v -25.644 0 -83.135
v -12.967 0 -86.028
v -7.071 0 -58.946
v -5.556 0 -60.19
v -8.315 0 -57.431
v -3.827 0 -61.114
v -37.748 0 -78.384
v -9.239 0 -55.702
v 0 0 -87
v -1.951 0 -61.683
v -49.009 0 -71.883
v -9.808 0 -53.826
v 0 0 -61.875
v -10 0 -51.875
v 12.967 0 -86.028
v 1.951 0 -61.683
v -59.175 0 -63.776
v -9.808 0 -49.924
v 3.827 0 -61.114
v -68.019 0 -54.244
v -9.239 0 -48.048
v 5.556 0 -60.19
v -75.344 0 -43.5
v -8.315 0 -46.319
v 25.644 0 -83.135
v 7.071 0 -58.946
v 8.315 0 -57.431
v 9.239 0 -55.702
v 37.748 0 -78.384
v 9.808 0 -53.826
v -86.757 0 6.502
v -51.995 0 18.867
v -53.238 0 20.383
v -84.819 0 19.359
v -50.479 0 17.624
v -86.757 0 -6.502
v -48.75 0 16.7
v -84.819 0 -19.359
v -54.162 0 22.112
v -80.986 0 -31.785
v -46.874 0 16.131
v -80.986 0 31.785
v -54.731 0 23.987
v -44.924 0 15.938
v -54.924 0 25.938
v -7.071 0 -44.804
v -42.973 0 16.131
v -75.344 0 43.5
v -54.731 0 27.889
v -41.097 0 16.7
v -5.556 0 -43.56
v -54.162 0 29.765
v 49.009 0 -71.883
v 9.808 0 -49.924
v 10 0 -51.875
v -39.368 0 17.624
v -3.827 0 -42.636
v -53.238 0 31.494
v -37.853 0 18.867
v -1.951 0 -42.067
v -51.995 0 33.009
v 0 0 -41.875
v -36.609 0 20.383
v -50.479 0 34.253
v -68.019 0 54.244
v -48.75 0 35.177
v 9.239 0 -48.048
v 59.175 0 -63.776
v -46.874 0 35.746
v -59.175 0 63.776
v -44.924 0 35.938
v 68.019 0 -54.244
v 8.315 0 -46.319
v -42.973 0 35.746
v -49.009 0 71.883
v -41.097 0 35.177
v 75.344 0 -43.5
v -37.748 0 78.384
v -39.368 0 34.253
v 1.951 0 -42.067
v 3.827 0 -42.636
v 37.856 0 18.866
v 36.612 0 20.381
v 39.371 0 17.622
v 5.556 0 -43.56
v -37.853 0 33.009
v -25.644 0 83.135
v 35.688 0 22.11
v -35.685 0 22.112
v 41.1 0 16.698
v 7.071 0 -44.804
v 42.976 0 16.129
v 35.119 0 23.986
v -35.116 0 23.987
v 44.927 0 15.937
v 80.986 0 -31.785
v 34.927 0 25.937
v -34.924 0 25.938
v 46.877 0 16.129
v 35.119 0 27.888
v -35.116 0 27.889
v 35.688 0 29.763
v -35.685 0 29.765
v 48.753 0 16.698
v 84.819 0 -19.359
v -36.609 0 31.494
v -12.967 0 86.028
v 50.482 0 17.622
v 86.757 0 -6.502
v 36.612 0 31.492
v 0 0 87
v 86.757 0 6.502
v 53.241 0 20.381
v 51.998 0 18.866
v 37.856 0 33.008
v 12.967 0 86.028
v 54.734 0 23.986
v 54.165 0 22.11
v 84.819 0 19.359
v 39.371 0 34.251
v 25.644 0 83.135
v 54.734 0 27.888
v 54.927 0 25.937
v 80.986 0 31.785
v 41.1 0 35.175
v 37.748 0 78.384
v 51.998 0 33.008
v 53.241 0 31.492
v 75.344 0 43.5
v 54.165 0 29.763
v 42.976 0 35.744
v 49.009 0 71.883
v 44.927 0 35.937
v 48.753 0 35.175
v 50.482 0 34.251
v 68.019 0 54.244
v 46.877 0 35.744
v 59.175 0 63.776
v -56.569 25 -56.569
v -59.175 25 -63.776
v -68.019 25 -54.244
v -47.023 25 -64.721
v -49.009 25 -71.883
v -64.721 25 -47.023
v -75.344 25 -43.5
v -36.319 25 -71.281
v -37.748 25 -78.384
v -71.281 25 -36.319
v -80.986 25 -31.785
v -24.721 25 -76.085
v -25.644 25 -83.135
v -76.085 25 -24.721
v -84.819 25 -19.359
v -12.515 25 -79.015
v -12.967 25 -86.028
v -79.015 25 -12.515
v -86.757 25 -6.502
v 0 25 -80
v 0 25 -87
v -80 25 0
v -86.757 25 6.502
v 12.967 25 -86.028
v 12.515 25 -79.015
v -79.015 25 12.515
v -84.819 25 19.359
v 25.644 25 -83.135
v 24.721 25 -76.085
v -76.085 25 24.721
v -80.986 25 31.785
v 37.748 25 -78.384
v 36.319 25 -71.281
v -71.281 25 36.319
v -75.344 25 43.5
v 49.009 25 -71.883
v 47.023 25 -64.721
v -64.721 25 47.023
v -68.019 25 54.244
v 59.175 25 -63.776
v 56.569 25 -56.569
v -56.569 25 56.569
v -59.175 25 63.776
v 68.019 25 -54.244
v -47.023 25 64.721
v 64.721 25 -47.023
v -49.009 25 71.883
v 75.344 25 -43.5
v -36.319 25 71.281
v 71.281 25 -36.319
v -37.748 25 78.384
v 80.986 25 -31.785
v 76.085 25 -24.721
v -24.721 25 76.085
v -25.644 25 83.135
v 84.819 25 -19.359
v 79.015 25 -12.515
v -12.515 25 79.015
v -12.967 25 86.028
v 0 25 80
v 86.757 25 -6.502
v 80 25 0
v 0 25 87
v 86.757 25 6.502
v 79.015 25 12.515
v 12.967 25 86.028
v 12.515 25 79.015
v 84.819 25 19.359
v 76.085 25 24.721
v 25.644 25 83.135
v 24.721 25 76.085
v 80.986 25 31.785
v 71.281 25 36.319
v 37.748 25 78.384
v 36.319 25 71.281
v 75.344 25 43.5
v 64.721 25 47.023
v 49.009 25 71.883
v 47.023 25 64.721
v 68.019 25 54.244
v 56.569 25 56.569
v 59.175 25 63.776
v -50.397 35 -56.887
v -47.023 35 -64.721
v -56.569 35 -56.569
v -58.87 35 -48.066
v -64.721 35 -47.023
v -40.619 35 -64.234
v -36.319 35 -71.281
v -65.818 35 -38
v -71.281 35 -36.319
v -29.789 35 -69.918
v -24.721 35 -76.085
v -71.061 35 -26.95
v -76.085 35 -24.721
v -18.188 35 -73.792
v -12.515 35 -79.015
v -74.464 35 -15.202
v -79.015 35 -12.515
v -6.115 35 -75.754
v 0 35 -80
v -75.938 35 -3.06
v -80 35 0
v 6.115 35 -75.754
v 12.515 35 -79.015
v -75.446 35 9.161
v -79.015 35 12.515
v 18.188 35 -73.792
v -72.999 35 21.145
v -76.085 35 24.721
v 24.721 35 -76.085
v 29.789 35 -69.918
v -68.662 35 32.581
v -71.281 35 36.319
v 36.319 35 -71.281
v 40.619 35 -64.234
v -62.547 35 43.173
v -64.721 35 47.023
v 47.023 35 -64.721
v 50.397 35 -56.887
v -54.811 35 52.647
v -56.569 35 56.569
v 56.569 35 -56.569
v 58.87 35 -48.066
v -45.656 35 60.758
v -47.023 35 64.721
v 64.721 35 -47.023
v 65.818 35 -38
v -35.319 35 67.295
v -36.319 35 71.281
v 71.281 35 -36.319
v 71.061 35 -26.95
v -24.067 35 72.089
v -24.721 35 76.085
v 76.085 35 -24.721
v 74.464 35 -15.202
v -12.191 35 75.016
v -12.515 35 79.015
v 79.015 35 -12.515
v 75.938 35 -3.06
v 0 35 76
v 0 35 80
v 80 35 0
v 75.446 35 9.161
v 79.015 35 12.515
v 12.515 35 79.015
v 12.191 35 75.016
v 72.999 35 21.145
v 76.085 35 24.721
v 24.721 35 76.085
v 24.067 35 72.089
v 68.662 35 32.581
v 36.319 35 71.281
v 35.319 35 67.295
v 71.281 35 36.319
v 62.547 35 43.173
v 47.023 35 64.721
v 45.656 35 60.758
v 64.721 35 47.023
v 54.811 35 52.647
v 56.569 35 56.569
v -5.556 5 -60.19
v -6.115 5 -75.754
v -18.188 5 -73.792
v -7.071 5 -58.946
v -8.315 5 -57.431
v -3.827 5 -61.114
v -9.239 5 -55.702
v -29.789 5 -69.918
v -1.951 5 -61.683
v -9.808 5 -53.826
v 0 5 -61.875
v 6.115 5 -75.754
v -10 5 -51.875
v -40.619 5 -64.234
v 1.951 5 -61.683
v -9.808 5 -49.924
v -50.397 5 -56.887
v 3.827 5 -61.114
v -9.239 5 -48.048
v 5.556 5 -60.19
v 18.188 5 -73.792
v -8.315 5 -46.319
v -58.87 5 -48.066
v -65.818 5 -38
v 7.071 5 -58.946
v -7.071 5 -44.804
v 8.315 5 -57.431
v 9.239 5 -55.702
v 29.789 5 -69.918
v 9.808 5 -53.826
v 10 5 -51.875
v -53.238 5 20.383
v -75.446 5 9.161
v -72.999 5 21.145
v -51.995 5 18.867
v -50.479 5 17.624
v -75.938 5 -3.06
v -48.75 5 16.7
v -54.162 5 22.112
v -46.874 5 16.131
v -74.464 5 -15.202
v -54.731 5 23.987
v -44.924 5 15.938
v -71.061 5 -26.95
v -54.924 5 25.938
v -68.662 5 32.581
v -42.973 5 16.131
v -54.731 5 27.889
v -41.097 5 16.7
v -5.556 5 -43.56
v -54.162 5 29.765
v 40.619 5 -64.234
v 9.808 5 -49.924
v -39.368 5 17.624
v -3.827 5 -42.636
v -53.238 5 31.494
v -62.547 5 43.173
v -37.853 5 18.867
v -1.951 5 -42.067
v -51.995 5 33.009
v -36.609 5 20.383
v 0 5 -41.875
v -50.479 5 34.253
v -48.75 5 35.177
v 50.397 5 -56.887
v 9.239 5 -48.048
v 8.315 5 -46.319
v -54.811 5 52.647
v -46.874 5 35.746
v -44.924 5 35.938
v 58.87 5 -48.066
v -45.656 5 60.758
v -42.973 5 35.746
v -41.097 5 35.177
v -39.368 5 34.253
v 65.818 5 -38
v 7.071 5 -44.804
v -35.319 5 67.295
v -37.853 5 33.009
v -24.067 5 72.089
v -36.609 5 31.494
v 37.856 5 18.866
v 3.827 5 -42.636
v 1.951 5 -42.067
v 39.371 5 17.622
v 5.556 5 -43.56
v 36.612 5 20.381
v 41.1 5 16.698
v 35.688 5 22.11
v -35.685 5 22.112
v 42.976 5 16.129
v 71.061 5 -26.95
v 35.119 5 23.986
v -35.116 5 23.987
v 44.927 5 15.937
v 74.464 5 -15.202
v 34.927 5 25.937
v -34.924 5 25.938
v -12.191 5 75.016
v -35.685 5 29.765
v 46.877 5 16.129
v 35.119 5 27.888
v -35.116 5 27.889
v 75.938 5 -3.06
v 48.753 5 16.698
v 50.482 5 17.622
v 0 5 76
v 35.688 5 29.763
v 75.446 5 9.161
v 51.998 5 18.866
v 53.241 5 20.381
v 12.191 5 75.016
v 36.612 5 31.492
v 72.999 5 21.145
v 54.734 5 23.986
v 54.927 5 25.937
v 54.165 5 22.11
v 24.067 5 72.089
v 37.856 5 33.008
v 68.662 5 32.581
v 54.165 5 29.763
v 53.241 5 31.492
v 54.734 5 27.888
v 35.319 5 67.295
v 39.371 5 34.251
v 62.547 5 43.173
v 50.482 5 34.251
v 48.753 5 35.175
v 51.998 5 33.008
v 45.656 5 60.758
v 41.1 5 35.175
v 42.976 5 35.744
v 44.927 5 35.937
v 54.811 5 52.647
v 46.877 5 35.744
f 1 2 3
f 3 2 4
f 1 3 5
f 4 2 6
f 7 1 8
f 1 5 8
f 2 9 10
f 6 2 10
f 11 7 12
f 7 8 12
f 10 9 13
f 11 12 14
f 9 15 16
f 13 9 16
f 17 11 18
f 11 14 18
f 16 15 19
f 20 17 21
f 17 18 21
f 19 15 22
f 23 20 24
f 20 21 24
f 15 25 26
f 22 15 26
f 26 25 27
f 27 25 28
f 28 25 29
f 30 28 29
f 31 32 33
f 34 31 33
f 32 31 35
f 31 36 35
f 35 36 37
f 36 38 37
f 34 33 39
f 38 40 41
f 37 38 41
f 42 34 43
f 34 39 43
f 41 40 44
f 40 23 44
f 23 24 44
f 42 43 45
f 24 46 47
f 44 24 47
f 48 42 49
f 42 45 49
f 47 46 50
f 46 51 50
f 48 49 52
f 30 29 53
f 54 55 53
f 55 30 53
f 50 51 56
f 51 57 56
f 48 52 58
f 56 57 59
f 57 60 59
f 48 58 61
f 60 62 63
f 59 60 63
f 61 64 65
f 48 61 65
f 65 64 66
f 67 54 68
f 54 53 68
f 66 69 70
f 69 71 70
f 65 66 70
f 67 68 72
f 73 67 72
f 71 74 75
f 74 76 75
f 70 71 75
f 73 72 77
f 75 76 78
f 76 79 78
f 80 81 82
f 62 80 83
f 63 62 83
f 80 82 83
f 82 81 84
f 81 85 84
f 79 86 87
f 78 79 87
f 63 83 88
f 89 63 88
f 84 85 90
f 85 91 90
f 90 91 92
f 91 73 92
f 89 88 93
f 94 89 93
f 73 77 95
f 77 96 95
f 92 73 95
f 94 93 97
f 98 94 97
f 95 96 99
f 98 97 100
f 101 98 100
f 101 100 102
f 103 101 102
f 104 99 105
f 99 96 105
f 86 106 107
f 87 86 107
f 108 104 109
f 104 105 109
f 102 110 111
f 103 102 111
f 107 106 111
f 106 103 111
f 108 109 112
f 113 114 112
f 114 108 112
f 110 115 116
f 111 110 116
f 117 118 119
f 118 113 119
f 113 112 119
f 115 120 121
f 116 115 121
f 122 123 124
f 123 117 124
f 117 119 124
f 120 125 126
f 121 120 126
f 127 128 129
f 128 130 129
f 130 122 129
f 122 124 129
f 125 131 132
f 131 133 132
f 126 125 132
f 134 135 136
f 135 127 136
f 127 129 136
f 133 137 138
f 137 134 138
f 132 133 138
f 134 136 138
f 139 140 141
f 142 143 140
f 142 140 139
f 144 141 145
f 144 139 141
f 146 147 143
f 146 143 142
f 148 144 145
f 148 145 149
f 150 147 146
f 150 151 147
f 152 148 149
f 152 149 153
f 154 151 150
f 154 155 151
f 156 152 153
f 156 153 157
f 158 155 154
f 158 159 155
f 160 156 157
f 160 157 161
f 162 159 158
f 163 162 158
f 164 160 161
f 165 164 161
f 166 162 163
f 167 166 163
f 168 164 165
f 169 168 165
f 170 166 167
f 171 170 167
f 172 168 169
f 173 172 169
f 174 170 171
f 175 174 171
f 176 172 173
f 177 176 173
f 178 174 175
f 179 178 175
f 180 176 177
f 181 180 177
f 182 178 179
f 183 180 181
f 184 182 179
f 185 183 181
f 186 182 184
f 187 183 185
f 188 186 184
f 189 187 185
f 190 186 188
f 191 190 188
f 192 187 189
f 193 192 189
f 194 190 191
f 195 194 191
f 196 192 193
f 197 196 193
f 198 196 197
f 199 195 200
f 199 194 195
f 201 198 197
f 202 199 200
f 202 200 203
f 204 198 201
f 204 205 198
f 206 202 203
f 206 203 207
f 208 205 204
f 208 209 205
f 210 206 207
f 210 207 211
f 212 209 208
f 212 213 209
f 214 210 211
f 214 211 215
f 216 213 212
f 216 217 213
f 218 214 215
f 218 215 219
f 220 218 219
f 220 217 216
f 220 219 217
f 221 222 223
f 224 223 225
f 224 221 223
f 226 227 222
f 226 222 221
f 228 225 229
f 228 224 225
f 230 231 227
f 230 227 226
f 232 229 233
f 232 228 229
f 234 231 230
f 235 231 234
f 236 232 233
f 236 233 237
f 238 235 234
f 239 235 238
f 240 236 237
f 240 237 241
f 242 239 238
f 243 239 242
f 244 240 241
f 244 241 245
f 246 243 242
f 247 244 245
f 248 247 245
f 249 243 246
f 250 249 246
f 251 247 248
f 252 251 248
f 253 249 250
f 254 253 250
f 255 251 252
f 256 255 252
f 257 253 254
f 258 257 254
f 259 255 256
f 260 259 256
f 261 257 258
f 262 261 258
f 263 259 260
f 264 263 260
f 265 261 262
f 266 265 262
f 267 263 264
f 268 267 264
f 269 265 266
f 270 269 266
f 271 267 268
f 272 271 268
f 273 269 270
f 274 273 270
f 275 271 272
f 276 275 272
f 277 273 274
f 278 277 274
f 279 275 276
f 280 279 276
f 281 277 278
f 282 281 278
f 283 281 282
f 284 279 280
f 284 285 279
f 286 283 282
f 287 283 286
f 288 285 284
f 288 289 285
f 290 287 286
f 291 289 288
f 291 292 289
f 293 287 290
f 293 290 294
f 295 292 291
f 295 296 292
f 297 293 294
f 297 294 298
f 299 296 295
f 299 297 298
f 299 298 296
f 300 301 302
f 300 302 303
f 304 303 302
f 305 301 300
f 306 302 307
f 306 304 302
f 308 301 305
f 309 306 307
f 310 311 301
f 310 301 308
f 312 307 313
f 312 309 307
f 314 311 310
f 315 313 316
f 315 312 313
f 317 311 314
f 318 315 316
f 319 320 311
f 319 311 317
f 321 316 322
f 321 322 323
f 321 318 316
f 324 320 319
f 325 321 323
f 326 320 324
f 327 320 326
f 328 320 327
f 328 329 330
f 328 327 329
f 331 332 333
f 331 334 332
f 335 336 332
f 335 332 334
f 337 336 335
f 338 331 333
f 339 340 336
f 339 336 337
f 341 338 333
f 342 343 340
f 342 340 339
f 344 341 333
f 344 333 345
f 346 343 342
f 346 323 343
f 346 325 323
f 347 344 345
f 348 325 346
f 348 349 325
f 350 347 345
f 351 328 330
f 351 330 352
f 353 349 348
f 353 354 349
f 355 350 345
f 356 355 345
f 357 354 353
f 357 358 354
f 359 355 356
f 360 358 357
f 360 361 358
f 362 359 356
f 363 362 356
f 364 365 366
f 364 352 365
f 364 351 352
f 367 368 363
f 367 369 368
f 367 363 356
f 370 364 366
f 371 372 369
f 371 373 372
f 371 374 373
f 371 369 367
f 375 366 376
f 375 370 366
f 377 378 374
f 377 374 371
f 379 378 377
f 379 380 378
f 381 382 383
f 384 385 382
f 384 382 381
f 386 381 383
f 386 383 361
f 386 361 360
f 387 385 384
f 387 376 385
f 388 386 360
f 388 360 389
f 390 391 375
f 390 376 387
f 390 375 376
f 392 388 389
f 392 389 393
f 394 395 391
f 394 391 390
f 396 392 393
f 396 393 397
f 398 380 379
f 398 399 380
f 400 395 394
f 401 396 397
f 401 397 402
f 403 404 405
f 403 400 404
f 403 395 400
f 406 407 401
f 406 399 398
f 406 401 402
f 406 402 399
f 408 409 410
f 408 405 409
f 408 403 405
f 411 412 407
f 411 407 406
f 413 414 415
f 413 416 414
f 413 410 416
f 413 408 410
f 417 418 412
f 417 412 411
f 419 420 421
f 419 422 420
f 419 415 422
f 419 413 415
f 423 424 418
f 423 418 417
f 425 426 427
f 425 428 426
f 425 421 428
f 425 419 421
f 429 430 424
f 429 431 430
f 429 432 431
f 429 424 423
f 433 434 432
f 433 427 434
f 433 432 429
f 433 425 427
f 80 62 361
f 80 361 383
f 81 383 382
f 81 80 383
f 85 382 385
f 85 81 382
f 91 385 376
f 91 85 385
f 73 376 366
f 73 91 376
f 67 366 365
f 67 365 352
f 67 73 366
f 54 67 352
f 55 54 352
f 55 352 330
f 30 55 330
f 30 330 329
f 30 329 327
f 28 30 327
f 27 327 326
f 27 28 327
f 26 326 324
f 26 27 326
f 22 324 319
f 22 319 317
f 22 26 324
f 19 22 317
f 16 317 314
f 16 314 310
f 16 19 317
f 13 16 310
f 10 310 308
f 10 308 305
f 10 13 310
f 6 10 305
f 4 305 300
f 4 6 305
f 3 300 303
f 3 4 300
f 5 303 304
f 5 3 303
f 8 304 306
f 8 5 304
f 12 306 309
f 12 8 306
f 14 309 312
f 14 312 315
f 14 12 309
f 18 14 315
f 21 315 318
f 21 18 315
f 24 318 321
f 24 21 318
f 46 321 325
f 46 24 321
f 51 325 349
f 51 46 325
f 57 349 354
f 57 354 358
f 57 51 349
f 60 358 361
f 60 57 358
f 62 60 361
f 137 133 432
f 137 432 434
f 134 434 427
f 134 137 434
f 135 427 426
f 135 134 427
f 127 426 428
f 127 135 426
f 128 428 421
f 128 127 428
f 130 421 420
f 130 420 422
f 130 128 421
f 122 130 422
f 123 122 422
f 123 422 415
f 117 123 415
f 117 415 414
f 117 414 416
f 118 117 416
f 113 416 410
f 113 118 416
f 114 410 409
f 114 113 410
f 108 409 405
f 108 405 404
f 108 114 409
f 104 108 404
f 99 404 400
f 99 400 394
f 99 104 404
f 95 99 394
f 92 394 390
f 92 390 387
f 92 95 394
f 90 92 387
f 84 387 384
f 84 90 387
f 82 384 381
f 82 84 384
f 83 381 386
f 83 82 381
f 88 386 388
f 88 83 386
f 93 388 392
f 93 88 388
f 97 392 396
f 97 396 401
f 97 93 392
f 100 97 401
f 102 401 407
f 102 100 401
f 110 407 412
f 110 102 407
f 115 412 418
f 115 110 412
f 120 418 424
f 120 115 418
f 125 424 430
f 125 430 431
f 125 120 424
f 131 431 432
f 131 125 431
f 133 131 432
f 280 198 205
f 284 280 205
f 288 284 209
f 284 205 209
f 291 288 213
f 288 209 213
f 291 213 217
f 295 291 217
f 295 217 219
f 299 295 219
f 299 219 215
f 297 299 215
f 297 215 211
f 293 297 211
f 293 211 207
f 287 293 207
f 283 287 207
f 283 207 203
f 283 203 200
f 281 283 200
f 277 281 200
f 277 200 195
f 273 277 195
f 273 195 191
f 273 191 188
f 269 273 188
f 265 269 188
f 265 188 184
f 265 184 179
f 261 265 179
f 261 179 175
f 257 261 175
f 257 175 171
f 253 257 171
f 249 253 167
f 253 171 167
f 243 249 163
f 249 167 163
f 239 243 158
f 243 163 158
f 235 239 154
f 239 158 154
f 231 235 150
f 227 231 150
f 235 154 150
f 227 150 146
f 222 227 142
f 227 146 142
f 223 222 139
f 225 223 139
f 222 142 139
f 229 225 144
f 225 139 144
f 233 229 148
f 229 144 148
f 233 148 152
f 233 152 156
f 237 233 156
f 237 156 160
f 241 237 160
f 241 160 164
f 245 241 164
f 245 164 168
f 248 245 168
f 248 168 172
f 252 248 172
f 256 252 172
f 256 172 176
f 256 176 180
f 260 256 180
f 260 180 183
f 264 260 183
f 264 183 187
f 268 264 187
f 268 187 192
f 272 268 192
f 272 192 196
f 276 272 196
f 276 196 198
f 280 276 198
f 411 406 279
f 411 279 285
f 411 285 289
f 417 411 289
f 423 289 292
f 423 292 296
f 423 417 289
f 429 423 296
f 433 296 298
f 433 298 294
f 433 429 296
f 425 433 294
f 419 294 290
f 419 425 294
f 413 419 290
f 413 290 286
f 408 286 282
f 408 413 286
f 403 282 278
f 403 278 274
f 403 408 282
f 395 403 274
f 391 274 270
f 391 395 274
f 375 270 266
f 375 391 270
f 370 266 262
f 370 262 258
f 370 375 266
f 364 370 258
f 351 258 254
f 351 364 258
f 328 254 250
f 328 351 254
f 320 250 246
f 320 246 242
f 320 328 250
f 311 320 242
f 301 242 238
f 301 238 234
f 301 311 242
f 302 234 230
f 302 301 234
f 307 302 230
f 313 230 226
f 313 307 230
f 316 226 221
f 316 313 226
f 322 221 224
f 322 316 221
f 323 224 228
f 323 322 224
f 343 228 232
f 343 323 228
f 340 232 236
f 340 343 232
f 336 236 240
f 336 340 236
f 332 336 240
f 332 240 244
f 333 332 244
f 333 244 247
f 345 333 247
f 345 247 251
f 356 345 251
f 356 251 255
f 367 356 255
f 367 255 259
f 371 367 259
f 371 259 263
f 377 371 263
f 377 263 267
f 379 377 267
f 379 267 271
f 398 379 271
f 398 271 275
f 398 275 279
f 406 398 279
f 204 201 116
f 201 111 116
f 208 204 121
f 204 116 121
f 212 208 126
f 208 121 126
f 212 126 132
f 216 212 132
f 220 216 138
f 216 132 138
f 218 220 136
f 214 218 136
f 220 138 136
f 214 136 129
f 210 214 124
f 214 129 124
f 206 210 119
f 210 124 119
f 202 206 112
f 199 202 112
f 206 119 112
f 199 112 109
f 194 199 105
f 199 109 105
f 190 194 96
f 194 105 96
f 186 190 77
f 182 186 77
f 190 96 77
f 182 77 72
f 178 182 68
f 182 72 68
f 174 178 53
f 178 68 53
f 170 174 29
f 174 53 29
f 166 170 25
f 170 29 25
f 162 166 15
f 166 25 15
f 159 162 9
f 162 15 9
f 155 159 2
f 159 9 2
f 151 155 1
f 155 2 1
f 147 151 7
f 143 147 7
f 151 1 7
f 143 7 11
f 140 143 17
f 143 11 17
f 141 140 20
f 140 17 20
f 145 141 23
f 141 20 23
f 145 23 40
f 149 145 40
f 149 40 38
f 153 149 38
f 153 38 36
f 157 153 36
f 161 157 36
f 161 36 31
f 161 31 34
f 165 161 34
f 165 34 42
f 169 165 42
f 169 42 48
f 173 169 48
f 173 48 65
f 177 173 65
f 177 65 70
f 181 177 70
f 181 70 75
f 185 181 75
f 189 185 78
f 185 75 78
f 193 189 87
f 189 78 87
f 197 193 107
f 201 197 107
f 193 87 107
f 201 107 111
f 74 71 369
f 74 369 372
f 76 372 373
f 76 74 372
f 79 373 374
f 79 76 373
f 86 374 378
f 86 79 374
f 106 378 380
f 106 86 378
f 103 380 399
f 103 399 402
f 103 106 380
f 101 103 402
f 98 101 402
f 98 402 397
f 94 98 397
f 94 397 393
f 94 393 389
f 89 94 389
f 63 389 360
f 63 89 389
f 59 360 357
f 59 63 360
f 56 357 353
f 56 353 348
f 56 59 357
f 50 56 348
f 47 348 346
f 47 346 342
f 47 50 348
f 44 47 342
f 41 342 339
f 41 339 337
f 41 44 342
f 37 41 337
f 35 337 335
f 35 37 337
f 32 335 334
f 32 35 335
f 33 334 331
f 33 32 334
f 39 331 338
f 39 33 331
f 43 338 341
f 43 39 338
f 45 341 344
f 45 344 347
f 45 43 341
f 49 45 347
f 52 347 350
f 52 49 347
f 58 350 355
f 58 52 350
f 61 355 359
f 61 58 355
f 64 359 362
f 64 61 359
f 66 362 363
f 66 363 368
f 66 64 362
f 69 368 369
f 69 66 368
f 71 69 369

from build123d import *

# Parameters (mm, degrees)
SKETCH1_R           = 87
SKETCH1_R_2         = 10
BOSS_EXTRUDE1_DEPTH = 5
SKETCH2_R           = 80
SKETCH2_R_2         = 76
BOSS_EXTRUDE2_DEPTH = 30
SKETCH3_R           = 87
SKETCH3_R_2         = 80
BOSS_EXTRUDE3_DEPTH = 20


with BuildPart() as part:
    # Sketch1 → Boss-Extrude1 (new body)
    with BuildSketch(Plane(origin=(0, 0, 0), x_dir=(1, 0, 0), z_dir=(0, 1, 0))):
        with Locations(Location((0, 0, 0), (0, 0, 270))):
            Circle(SKETCH1_R)
        with Locations(Location((0, 51.875, 0), (0, 0, 270))):
            Circle(SKETCH1_R_2, mode=Mode.SUBTRACT)
        with Locations(Location((44.926567821, -25.936633975, 0), (0, 0, 270))):
            Circle(SKETCH1_R_2, mode=Mode.SUBTRACT)
        with Locations(Location((-44.923567821, -25.938366025, 0), (0, 0, 270))):
            Circle(SKETCH1_R_2, mode=Mode.SUBTRACT)
    extrude(amount=BOSS_EXTRUDE1_DEPTH)

    # Sketch2 → Boss-Extrude2 (add)
    with BuildSketch(Plane(origin=(0, 5, 0), x_dir=(1, 0, 0), z_dir=(0, 1, 0))):
        with Locations(Location((0, 0, 0), (0, 0, 270))):
            Circle(SKETCH2_R)
        with Locations(Location((0, 0, 0), (0, 0, 270))):
            Circle(SKETCH2_R_2, mode=Mode.SUBTRACT)
    extrude(amount=BOSS_EXTRUDE2_DEPTH)

    # Sketch3 → Boss-Extrude3 (add)
    with BuildSketch(Plane(origin=(0, 5, 0), x_dir=(1, 0, 0), z_dir=(0, 1, 0))):
        with Locations(Location((0, 0, 0), (0, 0, 270))):
            Circle(SKETCH3_R)
        with Locations(Location((0, 0, 0), (0, 0, 270))):
            Circle(SKETCH3_R_2, mode=Mode.SUBTRACT)
    extrude(amount=BOSS_EXTRUDE3_DEPTH)


solid = part.part
